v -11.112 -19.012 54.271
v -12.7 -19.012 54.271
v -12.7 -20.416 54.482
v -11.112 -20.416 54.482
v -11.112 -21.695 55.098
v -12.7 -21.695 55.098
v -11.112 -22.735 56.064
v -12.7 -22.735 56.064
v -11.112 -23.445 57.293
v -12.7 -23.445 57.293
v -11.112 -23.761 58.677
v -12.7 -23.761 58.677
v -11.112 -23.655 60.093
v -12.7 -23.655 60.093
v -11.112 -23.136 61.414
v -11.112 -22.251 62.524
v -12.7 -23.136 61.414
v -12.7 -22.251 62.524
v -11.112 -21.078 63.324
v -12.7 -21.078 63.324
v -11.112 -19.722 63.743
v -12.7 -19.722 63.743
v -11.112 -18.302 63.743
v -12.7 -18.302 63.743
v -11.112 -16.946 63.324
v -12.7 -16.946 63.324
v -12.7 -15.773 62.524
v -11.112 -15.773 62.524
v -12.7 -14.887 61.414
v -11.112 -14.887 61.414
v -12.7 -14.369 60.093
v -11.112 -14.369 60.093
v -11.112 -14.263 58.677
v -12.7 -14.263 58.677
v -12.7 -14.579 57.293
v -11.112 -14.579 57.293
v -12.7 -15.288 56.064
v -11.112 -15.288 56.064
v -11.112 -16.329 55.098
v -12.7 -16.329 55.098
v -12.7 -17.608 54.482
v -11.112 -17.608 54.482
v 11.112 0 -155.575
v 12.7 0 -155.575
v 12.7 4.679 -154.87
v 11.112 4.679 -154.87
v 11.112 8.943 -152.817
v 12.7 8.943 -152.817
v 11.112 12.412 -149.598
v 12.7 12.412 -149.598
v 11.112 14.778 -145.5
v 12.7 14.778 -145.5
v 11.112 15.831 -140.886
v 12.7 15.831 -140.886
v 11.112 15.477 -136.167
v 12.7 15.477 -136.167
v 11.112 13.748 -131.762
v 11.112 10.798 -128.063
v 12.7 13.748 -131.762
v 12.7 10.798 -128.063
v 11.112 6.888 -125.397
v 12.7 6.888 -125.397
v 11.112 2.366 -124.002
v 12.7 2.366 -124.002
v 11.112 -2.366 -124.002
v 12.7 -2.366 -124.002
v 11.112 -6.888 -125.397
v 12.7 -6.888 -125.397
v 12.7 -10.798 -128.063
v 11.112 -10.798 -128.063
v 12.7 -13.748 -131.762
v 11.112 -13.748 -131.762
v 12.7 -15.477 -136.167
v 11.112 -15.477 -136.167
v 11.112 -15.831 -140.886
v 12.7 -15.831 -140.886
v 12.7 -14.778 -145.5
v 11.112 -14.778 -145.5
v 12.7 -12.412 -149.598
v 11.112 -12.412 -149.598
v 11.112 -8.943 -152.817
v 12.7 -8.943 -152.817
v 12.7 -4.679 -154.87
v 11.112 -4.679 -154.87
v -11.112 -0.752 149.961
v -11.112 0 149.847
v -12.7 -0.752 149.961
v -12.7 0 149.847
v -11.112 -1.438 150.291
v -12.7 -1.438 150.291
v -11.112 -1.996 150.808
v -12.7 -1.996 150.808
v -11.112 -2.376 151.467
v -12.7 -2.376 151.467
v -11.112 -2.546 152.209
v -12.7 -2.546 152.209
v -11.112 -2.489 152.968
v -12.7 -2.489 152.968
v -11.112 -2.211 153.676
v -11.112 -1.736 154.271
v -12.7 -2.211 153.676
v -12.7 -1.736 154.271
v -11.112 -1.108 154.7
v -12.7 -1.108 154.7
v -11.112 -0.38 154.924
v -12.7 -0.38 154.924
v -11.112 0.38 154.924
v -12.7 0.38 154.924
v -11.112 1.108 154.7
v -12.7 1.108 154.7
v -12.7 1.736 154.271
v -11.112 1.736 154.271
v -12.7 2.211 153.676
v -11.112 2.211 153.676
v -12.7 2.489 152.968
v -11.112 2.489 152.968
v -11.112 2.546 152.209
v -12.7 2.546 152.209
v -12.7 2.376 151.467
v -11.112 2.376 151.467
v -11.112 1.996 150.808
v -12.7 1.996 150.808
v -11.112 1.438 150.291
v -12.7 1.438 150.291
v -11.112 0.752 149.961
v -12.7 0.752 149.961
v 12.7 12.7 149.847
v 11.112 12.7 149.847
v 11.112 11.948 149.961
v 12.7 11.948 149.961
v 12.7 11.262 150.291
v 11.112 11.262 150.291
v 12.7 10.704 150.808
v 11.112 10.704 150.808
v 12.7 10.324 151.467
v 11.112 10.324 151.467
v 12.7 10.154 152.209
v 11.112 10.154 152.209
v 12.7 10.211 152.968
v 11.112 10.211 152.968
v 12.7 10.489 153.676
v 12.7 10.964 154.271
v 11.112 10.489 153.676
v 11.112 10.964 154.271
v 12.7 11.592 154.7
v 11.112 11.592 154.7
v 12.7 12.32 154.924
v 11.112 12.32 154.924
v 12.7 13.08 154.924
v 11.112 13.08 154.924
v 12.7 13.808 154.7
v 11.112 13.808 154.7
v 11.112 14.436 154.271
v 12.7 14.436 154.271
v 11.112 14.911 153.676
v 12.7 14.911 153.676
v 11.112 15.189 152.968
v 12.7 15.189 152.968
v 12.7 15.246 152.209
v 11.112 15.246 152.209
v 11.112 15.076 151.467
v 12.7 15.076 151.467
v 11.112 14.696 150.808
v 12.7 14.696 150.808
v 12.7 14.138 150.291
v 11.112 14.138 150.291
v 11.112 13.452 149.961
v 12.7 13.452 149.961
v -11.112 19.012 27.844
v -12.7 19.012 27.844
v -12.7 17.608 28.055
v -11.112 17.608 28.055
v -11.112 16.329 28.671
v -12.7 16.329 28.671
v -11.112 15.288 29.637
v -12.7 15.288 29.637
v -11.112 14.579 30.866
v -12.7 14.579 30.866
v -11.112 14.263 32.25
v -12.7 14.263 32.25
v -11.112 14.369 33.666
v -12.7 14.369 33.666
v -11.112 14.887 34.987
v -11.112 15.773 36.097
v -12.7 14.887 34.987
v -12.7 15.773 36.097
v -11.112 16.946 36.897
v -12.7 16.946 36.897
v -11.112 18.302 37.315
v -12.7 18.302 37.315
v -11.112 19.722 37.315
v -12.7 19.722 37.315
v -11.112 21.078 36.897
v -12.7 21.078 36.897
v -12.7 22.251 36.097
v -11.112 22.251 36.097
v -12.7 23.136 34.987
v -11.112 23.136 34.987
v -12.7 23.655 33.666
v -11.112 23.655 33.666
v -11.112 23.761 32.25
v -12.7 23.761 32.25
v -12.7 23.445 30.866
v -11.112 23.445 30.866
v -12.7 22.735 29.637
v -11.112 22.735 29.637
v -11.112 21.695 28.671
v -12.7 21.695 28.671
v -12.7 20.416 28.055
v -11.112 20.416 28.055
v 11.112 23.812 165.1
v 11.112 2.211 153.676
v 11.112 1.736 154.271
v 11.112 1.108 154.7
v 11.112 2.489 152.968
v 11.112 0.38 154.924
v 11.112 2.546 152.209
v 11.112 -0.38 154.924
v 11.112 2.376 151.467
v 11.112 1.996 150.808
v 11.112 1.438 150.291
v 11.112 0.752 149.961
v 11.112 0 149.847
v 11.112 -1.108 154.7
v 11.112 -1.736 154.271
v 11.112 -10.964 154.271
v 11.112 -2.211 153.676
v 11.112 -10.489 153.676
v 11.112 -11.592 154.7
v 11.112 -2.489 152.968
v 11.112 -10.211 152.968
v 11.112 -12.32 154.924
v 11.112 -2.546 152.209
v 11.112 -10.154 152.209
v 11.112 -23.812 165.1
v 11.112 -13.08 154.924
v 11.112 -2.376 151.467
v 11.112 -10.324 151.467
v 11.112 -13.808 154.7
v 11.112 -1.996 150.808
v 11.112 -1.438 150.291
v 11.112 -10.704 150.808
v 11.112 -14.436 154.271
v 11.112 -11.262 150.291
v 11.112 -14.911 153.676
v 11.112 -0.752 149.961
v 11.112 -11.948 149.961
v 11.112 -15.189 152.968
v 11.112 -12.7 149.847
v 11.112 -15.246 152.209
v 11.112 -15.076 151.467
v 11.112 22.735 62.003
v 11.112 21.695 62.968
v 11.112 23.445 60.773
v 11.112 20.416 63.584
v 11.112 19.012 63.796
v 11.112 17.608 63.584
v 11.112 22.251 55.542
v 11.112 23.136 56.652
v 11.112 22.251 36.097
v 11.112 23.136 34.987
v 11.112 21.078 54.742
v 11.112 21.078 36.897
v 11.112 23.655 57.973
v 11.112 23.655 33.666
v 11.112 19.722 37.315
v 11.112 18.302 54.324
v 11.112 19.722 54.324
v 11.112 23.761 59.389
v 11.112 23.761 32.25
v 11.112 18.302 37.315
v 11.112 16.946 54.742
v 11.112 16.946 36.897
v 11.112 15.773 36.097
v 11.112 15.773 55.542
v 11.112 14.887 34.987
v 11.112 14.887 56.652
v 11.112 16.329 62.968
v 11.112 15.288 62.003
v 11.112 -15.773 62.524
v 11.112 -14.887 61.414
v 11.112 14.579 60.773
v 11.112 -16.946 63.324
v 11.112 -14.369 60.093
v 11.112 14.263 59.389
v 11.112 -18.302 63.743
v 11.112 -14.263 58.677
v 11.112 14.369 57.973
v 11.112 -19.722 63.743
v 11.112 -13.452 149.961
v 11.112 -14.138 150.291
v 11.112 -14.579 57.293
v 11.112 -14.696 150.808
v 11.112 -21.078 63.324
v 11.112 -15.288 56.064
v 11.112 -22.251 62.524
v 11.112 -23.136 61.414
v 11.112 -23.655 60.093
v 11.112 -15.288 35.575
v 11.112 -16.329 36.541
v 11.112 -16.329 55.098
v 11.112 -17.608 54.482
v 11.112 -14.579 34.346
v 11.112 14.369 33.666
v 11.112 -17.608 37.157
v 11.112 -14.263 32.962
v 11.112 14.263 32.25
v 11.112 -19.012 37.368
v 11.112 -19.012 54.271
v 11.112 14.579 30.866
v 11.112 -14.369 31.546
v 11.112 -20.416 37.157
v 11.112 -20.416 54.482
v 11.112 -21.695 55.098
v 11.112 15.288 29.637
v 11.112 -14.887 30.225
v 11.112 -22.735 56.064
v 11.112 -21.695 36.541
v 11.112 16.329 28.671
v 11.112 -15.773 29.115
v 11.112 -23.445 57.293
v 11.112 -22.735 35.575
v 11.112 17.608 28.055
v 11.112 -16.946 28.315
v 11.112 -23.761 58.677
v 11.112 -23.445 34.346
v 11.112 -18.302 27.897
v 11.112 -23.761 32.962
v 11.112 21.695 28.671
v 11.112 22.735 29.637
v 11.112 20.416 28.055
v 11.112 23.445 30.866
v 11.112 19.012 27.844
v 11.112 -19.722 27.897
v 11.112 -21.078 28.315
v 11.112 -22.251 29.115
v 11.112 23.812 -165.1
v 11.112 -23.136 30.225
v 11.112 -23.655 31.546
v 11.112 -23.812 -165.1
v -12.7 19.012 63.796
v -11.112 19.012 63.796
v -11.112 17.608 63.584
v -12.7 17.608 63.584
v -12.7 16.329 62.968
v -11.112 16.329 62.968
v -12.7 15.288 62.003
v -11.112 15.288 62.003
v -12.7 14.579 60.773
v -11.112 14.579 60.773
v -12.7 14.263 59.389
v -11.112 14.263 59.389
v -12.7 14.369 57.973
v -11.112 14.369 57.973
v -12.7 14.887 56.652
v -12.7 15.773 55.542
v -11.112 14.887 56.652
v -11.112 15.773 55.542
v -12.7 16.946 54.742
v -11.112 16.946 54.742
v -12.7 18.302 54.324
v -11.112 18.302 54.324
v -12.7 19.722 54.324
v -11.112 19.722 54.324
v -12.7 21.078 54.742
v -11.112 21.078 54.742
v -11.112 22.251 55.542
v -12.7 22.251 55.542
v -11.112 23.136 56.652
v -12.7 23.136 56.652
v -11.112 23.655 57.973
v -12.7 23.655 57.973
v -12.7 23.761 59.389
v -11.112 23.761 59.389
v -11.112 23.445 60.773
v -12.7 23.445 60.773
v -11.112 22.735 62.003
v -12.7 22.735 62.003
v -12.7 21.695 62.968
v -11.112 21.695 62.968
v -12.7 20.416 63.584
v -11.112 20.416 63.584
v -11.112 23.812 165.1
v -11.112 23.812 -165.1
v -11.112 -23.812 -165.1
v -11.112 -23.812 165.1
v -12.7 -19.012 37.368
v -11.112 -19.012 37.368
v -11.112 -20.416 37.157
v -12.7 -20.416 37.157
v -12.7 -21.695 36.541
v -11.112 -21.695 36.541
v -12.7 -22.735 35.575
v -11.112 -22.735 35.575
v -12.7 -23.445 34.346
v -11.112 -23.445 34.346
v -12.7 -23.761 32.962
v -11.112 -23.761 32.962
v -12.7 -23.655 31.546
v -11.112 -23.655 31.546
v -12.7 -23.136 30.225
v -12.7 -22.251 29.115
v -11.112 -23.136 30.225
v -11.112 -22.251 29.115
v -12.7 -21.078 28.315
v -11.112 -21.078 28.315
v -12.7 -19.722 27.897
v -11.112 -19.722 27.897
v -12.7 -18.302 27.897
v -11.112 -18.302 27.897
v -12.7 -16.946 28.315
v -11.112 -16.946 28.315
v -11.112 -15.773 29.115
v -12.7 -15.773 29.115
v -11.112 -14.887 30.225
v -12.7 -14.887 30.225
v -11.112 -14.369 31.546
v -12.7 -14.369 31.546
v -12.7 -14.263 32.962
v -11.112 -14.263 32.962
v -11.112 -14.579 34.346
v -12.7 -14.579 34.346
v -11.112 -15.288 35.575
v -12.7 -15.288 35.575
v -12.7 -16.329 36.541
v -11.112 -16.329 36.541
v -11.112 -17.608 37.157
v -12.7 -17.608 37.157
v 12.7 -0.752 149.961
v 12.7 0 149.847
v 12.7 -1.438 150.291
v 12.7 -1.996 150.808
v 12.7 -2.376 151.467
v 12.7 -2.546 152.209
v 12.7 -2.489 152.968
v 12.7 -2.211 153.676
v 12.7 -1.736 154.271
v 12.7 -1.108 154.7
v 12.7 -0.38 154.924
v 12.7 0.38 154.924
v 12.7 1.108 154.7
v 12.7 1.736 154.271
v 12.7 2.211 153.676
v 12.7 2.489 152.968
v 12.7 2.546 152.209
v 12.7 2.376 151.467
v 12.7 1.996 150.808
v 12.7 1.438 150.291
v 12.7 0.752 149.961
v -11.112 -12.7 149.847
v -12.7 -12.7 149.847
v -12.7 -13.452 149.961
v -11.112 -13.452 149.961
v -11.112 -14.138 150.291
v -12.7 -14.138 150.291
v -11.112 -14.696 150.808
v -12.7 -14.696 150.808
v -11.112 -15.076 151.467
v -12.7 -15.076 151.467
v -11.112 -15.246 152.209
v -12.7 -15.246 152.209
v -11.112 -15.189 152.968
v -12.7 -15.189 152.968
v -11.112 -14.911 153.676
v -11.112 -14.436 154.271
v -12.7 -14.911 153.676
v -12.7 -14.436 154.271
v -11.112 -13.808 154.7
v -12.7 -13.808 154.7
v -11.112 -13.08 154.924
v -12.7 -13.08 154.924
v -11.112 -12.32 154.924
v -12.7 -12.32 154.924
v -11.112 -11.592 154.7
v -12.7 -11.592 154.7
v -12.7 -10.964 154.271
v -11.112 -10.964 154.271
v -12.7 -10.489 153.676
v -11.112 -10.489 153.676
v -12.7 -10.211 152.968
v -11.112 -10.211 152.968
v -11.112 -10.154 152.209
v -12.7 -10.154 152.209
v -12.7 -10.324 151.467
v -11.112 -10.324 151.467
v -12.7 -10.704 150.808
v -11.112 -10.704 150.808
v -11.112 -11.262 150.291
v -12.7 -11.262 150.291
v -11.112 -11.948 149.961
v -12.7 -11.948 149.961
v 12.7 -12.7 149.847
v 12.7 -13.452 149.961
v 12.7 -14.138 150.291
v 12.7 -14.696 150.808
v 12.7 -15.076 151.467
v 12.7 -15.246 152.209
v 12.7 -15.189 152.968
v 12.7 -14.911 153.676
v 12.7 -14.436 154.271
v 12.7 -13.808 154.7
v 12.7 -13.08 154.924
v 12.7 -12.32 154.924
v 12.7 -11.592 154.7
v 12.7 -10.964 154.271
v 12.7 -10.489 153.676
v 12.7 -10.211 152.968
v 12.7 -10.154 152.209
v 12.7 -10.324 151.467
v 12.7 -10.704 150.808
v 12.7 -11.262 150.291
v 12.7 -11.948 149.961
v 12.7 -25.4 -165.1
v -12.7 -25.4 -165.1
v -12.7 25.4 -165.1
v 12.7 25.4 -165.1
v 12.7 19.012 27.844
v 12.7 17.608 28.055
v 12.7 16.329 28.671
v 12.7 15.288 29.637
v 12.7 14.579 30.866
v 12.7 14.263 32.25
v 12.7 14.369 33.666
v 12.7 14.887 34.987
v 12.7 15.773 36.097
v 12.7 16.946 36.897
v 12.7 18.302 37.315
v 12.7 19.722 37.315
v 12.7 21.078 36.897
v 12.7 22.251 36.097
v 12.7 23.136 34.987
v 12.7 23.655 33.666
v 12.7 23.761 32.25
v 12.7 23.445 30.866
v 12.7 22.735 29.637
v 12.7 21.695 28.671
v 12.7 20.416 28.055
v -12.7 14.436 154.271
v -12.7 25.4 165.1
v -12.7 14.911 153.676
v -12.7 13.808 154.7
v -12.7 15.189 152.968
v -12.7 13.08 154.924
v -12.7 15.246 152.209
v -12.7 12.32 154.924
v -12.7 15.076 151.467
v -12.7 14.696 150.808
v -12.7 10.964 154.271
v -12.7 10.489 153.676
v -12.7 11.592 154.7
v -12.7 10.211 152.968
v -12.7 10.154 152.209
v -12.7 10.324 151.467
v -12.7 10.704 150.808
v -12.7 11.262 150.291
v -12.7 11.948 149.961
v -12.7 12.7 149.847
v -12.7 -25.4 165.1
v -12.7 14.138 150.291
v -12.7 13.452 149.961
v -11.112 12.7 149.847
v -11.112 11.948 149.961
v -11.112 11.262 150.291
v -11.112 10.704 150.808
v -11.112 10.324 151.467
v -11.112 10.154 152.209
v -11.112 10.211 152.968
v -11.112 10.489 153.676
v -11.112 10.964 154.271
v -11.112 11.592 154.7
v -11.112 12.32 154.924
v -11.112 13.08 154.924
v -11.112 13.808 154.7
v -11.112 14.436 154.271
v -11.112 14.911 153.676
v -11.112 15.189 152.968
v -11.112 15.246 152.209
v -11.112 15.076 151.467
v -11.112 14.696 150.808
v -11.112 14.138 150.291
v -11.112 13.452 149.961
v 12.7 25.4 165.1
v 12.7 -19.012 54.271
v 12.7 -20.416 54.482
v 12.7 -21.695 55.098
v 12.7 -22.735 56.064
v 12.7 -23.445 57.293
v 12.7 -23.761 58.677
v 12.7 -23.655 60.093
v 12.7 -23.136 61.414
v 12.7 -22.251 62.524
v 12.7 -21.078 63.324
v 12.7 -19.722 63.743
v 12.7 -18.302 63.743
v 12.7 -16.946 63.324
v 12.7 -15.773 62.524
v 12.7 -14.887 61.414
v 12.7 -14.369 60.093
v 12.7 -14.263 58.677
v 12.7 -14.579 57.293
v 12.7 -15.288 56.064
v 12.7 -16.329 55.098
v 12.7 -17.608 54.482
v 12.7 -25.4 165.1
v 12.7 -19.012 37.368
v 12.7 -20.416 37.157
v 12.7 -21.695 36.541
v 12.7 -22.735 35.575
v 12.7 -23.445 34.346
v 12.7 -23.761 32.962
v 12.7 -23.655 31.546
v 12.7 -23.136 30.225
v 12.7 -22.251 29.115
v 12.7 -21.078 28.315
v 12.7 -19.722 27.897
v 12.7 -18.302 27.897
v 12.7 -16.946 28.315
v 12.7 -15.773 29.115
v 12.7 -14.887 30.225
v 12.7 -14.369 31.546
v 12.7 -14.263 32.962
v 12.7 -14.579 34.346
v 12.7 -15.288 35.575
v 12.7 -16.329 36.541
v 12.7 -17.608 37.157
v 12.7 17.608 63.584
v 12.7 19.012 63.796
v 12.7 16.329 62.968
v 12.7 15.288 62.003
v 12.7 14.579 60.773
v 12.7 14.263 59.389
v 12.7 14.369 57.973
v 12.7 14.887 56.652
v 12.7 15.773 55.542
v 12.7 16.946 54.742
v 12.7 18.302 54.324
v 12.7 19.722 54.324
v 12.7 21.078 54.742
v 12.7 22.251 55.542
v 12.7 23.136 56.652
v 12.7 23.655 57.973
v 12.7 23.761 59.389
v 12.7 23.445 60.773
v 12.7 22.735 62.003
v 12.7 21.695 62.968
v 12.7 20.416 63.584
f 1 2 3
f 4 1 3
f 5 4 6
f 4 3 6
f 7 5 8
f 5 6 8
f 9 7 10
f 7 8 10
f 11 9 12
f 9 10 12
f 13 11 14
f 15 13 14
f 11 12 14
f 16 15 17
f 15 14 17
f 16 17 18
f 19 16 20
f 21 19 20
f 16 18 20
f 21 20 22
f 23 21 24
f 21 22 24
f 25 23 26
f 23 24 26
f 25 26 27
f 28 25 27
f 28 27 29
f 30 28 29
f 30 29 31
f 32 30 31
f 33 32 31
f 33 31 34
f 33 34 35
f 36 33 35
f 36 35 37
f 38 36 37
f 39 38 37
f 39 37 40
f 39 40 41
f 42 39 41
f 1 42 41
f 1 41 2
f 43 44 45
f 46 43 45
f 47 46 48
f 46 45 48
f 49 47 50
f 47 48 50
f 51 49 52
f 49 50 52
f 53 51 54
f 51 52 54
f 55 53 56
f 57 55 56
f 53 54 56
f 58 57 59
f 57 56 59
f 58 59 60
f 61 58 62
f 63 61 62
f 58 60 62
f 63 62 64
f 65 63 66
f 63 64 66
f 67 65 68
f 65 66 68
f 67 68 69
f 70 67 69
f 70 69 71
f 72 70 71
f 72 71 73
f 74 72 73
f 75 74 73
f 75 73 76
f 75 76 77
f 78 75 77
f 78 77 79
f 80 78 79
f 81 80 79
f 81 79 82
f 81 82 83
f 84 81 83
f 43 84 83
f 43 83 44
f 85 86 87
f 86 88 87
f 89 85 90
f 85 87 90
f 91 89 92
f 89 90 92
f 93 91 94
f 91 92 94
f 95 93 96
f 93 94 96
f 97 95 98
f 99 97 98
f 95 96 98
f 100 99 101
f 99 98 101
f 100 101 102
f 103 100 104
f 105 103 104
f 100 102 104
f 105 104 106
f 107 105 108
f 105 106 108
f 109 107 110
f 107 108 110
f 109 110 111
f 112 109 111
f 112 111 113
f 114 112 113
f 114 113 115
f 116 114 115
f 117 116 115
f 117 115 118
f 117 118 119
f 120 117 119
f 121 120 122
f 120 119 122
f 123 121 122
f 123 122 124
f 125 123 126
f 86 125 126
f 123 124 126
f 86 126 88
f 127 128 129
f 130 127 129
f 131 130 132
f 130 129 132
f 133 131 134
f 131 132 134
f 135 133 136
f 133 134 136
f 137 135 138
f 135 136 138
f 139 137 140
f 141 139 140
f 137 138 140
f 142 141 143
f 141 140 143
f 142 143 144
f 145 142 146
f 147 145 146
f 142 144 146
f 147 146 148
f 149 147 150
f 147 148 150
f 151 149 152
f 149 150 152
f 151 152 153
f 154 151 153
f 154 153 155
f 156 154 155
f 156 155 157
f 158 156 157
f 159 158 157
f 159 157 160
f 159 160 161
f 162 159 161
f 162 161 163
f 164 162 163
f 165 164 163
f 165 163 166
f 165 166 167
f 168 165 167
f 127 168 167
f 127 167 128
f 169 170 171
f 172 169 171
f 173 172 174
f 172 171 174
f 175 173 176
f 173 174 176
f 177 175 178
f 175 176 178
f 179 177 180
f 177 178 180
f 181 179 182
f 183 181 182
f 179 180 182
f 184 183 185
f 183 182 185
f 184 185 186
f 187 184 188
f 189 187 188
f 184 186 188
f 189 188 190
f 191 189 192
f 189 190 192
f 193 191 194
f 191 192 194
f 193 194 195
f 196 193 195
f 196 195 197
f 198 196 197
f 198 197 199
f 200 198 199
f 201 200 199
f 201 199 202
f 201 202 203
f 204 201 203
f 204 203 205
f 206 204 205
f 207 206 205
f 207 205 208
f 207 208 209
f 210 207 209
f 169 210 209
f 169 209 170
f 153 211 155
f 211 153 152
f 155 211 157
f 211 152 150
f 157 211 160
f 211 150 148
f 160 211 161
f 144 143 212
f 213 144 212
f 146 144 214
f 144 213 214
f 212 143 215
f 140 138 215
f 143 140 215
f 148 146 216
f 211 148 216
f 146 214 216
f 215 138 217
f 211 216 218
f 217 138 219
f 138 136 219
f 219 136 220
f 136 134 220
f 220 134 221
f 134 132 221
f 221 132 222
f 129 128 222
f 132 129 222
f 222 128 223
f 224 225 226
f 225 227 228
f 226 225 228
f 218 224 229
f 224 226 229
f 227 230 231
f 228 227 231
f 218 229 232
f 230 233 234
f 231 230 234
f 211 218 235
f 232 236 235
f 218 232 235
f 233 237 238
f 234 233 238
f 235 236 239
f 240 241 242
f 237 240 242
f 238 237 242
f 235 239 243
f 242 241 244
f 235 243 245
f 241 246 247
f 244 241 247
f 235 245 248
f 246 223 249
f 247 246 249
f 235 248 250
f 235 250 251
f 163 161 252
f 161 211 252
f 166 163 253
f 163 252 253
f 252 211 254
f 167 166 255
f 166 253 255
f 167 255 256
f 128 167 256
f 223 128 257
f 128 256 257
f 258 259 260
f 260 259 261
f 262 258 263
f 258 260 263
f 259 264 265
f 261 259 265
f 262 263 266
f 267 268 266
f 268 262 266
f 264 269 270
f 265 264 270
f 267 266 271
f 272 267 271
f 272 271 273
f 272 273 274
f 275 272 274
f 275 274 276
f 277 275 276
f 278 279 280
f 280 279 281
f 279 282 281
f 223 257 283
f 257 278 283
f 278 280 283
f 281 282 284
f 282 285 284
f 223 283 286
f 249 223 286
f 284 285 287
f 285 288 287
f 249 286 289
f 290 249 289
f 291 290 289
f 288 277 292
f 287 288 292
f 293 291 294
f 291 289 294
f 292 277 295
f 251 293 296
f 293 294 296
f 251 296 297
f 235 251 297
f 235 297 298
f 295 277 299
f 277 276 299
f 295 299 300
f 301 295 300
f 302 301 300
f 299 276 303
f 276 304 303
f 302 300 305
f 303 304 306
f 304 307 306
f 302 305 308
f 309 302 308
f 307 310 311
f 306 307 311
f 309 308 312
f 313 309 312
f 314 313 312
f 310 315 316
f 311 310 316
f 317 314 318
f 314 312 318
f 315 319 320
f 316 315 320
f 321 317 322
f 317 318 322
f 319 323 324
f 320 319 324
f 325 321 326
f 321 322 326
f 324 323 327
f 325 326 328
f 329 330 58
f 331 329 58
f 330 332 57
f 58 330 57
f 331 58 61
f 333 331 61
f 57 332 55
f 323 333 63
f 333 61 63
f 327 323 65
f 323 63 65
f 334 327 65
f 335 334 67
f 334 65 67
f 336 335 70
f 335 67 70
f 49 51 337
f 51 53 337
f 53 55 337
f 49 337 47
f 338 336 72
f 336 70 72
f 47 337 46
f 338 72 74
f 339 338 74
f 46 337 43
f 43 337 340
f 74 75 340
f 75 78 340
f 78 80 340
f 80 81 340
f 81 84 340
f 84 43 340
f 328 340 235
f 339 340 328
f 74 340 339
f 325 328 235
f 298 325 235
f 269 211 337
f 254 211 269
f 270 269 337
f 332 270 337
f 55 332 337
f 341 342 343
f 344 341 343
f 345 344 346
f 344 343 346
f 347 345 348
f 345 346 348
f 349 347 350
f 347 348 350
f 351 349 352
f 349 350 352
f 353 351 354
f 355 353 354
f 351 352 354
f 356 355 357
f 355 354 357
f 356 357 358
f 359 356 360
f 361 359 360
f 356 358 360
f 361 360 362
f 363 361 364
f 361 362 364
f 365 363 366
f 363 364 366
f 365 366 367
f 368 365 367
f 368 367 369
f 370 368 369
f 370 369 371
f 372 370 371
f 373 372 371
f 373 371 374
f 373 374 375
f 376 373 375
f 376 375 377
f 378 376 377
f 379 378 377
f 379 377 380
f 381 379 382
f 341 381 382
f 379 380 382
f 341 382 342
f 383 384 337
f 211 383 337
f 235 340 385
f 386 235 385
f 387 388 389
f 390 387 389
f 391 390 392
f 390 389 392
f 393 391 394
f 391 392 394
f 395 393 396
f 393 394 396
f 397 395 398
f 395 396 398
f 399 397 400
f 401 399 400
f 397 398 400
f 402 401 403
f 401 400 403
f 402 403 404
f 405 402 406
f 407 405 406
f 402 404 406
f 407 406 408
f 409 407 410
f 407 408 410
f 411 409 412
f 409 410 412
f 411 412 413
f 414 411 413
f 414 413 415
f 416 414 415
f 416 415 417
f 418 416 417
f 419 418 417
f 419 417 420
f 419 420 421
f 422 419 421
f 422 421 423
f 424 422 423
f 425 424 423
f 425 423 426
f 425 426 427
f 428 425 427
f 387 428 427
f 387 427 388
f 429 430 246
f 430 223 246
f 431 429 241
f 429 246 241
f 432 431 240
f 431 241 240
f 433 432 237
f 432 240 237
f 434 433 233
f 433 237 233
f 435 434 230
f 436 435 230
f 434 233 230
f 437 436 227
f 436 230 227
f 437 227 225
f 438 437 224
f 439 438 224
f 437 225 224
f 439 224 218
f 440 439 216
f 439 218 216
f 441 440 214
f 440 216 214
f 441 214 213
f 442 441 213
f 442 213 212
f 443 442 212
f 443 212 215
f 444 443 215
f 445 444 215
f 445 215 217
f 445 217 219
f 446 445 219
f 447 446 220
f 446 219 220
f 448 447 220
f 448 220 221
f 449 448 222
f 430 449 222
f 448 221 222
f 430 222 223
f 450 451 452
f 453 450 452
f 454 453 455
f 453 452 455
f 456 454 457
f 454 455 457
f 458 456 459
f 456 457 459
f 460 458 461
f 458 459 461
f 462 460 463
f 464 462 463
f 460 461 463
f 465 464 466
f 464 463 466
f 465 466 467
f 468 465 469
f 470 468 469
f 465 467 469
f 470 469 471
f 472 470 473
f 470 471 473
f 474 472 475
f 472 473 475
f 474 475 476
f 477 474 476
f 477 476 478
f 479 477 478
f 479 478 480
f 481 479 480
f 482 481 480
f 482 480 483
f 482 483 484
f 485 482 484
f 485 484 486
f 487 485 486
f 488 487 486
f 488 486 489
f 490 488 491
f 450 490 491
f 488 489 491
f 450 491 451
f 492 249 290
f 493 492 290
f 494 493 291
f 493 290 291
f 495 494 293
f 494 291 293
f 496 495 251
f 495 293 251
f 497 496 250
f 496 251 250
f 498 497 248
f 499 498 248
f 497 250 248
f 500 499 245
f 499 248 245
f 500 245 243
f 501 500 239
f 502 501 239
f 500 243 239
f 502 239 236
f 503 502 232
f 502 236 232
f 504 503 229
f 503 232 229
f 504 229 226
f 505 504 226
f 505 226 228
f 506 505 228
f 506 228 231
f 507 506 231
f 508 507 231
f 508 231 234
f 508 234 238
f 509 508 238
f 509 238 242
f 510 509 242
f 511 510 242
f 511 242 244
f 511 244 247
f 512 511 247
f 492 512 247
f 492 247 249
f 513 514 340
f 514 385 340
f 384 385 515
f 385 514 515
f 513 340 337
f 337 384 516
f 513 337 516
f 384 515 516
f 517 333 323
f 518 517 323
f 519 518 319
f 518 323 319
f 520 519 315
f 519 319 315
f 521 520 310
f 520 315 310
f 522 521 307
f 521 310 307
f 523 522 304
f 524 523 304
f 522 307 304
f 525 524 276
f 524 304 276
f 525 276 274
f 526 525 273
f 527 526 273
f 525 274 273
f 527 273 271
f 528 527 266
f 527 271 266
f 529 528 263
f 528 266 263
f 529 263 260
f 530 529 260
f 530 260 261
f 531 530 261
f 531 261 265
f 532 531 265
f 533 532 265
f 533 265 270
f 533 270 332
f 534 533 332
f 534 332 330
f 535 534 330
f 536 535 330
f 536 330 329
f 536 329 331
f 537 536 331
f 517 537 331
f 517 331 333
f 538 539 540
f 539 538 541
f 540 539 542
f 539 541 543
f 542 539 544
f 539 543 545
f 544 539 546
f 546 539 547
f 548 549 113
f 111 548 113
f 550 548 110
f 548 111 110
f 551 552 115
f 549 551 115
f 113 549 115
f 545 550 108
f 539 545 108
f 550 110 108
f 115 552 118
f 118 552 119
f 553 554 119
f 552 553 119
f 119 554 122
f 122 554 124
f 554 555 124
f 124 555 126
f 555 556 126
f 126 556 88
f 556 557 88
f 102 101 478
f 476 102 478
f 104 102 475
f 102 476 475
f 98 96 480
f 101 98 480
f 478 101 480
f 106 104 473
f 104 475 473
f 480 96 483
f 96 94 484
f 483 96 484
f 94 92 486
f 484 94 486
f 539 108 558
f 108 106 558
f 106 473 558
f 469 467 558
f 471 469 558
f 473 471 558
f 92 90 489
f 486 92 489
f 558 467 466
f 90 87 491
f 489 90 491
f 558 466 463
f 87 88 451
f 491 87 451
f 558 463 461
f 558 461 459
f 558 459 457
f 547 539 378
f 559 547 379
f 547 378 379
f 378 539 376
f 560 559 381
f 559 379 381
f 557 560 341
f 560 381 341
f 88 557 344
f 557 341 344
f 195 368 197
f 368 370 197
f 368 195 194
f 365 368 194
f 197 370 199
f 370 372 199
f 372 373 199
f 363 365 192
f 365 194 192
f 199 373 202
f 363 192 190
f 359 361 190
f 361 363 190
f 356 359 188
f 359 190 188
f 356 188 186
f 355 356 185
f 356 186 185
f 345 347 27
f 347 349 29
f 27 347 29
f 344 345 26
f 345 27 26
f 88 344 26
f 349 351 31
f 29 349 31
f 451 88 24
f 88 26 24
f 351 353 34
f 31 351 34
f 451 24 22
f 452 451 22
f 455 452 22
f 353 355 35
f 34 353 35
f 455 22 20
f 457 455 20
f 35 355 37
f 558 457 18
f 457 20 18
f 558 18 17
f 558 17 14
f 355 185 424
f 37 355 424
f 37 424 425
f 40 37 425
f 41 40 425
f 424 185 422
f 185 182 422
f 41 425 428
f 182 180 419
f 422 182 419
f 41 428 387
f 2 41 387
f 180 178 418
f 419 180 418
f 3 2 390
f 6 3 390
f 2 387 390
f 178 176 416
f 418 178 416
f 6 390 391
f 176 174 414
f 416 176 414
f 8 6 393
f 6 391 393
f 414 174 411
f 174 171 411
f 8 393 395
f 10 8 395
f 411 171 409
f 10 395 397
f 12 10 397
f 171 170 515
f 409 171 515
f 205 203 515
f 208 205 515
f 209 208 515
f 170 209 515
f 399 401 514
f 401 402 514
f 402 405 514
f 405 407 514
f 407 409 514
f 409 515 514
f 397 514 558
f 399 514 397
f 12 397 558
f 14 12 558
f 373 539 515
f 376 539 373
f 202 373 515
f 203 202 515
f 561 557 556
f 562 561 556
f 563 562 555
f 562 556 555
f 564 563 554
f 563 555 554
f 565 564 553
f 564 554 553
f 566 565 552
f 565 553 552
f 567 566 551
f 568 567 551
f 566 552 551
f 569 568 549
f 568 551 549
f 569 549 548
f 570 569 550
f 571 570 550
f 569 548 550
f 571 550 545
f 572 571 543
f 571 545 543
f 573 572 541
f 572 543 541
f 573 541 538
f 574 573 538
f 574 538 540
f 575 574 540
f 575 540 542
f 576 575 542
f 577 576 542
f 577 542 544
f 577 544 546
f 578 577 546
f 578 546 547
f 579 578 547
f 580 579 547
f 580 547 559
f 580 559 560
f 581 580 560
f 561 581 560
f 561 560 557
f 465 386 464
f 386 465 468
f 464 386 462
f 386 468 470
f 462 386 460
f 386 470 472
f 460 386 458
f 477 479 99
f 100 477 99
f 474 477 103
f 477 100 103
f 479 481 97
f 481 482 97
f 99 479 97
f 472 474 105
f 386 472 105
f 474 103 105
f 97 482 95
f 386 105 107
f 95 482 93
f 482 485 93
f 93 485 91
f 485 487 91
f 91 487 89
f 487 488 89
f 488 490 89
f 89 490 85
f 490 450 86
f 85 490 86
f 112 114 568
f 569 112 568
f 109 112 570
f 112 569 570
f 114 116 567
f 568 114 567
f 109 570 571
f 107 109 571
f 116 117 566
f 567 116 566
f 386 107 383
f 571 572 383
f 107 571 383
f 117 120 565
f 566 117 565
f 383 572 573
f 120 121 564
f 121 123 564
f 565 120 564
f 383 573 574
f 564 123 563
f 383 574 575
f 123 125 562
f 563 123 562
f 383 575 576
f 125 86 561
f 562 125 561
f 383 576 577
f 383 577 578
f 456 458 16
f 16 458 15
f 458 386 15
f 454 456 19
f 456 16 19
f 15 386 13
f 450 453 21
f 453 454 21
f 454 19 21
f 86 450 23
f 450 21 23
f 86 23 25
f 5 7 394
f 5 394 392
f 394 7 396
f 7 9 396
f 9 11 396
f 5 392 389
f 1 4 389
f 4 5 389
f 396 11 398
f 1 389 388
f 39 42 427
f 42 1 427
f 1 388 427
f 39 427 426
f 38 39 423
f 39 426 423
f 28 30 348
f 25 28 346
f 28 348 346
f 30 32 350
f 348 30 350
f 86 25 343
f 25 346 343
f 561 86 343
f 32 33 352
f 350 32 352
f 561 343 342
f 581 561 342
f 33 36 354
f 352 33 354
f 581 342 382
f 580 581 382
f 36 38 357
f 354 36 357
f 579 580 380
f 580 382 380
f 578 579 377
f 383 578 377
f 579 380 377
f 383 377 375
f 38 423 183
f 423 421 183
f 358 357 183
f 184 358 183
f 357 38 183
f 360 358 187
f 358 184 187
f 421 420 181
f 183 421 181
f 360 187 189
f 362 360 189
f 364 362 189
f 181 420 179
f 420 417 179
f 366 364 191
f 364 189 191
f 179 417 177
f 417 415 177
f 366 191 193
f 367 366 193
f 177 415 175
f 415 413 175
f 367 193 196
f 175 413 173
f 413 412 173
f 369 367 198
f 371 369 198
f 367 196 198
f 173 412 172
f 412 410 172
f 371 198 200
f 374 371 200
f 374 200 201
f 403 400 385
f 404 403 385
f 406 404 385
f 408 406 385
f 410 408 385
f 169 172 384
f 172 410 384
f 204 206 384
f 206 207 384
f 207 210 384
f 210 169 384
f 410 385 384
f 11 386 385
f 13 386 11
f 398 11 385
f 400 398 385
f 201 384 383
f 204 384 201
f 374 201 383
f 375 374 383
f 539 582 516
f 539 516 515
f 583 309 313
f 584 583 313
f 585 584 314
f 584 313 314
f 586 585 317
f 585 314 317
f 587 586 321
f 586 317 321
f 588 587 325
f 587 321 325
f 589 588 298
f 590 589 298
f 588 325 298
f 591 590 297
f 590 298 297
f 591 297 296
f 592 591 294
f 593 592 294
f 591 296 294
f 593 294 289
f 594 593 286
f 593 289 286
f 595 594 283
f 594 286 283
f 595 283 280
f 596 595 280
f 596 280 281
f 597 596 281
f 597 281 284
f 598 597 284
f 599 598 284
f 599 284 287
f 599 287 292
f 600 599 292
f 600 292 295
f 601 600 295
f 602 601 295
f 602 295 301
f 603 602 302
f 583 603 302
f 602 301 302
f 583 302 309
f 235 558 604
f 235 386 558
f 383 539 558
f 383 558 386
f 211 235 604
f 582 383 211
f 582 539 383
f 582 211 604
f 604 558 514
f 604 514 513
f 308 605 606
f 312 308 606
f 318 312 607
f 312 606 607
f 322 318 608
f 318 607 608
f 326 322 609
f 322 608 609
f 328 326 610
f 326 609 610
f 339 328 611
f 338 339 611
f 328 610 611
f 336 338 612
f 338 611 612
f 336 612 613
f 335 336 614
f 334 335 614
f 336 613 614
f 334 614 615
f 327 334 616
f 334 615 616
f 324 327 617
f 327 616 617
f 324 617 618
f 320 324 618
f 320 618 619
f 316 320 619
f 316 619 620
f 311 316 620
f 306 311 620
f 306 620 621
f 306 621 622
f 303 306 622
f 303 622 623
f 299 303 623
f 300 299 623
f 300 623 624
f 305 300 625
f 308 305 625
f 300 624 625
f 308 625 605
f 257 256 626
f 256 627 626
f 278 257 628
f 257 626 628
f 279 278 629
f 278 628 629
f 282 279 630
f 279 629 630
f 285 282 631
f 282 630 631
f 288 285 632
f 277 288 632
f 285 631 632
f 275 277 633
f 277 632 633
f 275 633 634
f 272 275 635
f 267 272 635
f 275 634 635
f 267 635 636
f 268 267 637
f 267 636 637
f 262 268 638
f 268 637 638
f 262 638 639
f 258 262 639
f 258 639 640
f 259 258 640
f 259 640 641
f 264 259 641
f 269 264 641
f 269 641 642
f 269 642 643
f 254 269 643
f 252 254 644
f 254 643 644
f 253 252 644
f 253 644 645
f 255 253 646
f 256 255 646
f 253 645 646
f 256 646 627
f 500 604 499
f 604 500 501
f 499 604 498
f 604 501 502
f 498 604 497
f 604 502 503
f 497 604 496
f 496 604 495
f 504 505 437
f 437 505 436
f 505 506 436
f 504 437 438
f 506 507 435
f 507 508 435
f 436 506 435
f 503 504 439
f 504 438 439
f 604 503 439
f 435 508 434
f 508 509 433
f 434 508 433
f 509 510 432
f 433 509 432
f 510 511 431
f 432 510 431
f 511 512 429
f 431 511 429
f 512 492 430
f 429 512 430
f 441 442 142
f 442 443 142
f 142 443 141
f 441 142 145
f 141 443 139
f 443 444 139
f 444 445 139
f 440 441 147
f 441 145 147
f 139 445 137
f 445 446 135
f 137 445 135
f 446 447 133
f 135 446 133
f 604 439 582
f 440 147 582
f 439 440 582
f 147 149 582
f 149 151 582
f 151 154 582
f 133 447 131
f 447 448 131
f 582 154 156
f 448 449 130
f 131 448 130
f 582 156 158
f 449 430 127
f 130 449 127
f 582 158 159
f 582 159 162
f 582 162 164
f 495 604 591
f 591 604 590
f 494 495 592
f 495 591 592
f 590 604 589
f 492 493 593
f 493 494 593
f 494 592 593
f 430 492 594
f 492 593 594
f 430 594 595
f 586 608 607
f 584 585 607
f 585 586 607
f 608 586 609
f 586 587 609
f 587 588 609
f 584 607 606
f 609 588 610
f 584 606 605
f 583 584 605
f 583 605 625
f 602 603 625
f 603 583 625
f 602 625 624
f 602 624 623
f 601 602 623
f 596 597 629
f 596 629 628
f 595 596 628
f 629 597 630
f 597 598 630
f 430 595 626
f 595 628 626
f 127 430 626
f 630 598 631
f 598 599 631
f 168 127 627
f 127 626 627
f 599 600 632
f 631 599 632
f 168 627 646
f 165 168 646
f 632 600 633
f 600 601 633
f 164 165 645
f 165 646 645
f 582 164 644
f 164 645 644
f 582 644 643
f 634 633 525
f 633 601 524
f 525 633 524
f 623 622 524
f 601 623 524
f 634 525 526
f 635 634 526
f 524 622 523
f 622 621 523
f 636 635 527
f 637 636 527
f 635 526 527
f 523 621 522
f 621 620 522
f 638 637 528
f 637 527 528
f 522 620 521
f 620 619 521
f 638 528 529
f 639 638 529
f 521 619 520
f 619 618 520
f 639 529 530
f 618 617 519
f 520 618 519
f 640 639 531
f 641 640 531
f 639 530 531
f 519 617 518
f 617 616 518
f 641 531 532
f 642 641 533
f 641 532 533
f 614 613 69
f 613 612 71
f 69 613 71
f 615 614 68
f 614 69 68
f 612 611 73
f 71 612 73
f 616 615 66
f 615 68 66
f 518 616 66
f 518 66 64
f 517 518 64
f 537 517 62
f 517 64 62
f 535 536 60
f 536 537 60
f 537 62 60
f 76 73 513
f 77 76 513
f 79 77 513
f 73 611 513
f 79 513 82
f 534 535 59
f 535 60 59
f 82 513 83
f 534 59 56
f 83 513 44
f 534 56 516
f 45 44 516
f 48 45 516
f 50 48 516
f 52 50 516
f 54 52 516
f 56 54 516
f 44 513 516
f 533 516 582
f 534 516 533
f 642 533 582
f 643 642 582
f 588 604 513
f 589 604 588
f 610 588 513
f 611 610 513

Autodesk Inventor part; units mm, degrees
ref_plane "YZ Plane" through (0, 0, 0) normal (1, 0, 0) x (0, 1, 0)
ref_plane "XZ Plane" through (0, 0, 0) normal (0, 1, 0) x (-1, 0, 0)
ref_plane "XY Plane" through (0, 0, 0) normal (0, 0, 1) x (1, 0, 0)
sketch "Sketch1" plane through (0, 0, 0) normal (0, 0, 1) x (1, 0, 0)
  line L0 (-12.7, -25.4) -> (12.7, -25.4)
  line L1 (12.7, -25.4) -> (12.7, 25.4)
  line L2 (12.7, 25.4) -> (-12.7, 25.4)
  line L3 (-12.7, 25.4) -> (-12.7, -25.4)
  line L4 (-12.7, -25.4) -> (12.7, 25.4) construction
  line L5 (12.7, -25.4) -> (-12.7, 25.4) construction
  line L6 (-11.1125, 23.8125) -> (11.1125, 23.8125)
  line L7 (11.1125, 23.8125) -> (11.1125, -23.8125)
  line L8 (11.1125, -23.8125) -> (-11.1125, -23.8125)
  line L9 (-11.1125, -23.8125) -> (-11.1125, 23.8125)
  point P0 (0, 0)
  dimension "width" = 25.4
  dimension "height" = 50.8
  dimension "thickness" = 1.5875
extrude "Extrusion1" add sketch "Sketch1" along normal mid plane 330.2
sketch "Sketch3" plane through (12.7, -25.4, -165.1) normal (1, 0, 0) x (0, 0, -1)
  circle A0 centre (-25.4, 25.4) radius 15.875
  line L0 (0, 50.8) -> (0, 0) projected
  point P0 (-165.1, 25.4)
  dimension "d8" = 31.75
  dimension "d9" = 25.4
extrude "Extrusion3" cut sketch "Sketch3" against normal up to surface (1.5875 mm away)
sketch "Sketch4" plane through (12.7, -25.4, 165.1) normal (1, 0, 0) x (0, 0, -1)
  circle A0 centre (304.8, 25.4) radius 15.875 construction
  line L0 (330.2, 50.8) -> (330.2, 0) construction
  line L1 (330.2, 0) -> (0, 0) construction
  line L2 (0, 0) -> (0, 50.8) construction
  line L3 (0, 50.8) -> (330.2, 50.8) construction
  point P0 (165.1, 25.4)
  point P1 (12.7, 25.4)
  point P2 (12.7, 12.7)
  point P3 (12.7, 38.1)
  point P4 (0, 25.4)
  dimension "d12" = 12.7
  dimension "d13" = 12.7
  dimension "d14" = 12.7
hole "Hole1" at (12.7, 0, 152.4) at (12.7, -12.7, 152.4) at (12.7, 12.7, 152.4) direction (-1, 0, 0) diameter 5.1054 end through all clearance for "Flat Head Machine Screw (82)" size "#10" standard "Ansi Unified Screw Threads"
sketch "Sketch6" plane through (-12.7, -25.4, 165.1) normal (-1, 0, 0) x (0, 0, 1)
  line L0 (-330.2, 0) -> (0, 0) construction
  line L1 (0, 0) -> (-152.4, 0) construction
  circle A0 centre (-12.7, 12.7) radius 2.5527 construction
  circle A1 centre (-12.7, 25.4) radius 2.5527 construction
  circle A2 centre (-12.7, 38.1) radius 2.5527 construction
  line L2 (-330.2, 0) -> (-330.2, 50.8) construction
  line L3 (-330.2, 50.8) -> (0, 50.8) construction
  line L4 (0, 50.8) -> (0, 0) construction
  line L5 (0, 0) -> (-330.2, 0) construction
  circle A3 centre (-12.7, 12.7) radius 2.5527 construction
  circle A4 centre (-12.7, 25.4) radius 2.5527 construction
  circle A5 centre (-12.7, 38.1) radius 2.5527 construction
  line L6 (-330.2, 0) -> (-330.2, 50.8) construction
  line L7 (-330.2, 50.8) -> (0, 50.8) construction
  line L8 (0, 50.8) -> (0, 0) construction
  line L9 (0, 0) -> (-330.2, 0) construction
  line L10 (-152.4, 0) -> (-50.8, 146.1832) construction
  line L11 (0, 0) -> (0, 203.2) construction
  line L12 (0, 203.2) -> (-50.8, 203.2) construction
  line L13 (-50.8, 203.2) -> (-50.8, 146.1832) construction
  circle A6 centre (-106.0668, 44.4119) radius 4.8006 construction
  circle A7 centre (-132.494, 6.3881) radius 4.8006 construction
  line L14 (-106.0668, 44.4119) -> (-132.494, 6.3881) construction
  circle A8 centre (-12.7, 12.7) radius 2.5527 construction
  circle A9 centre (-12.7, 25.4) radius 2.5527 construction
  circle A10 centre (-12.7, 38.1) radius 2.5527 construction
  line L15 (-330.2, 0) -> (-330.2, 50.8) construction
  line L16 (-330.2, 50.8) -> (0, 50.8) construction
  line L17 (0, 50.8) -> (0, 0) construction
  line L18 (0, 0) -> (-330.2, 0) construction
  line L19 (0, 1.5875) -> (-330.2, 1.5875) construction
  line L20 (-330.2, 49.2125) -> (0, 49.2125) construction
  point P0 (-165.1, 25.4)
  dimension "d35" = 152.4
  dimension "d36" = 55.2
  dimension "d37" = 203.2
  dimension "d38" = 50.8
  dimension "d39" = 9.6012
  dimension "d40" = 12.7
hole "Hole3" at (-12.7, 19.0119, 59.0332) at (-12.7, -19.0119, 32.606) direction (1, 0, 0) diameter 9.525 end through all
sketch "Sketch7" plane through (12.7, -25.4, 165.1) normal (1, 0, 0) x (0, 0, -1)
  circle A0 centre (106.0668, 44.4119) radius 4.7625 construction
  circle A1 centre (132.494, 6.3881) radius 4.7625 construction
  circle A2 centre (12.7, 12.7) radius 2.5527 construction
  circle A3 centre (12.7, 25.4) radius 2.5527 construction
  circle A4 centre (12.7, 38.1) radius 2.5527 construction
  circle A5 centre (304.8, 25.4) radius 15.875 construction
  line L0 (330.2, 50.8) -> (0, 50.8) construction
  line L1 (0, 0) -> (0, 50.8) construction
  line L2 (330.2, 0) -> (0, 0) construction
  line L3 (330.2, 50.8) -> (330.2, 0) construction
  line L4 (0, 1.5875) -> (330.2, 1.5875) construction
  line L5 (0, 49.2125) -> (330.2, 49.2125) construction
  line L6 (0, 50.8) -> (152.4, 50.8) construction
  line L7 (330.2, 50.8) -> (0, 50.8) construction
  line L8 (0, 50.8) -> (0, -152.4) construction
  line L9 (0, -152.4) -> (50.8, -152.4) construction
  line L10 (50.8, -152.4) -> (50.8, -95.3832) construction
  line L11 (152.4, 50.8) -> (50.8, -95.3832) construction
  circle A6 centre (132.494, 44.4119) radius 4.8006 construction
  circle A7 centre (106.0668, 6.3881) radius 4.8006 construction
  line L12 (106.0668, 6.3881) -> (132.494, 44.4119) construction
  point P0 (165.1, 25.4)
  dimension "d48" = 152.4
  dimension "d49" = 203.2
  dimension "d50" = 50.8
  dimension "d51" = 55.2
  dimension "d52" = 9.6012
  dimension "d53" = 12.7
hole "Hole4" at (12.7, -19.0119, 59.0332) at (12.7, 19.0119, 32.606) direction (-1, 0, 0) diameter 9.525 end through all
equation "\"d14\" = d13"
properties part number "CL3-003" material "Aluminum 6061"
